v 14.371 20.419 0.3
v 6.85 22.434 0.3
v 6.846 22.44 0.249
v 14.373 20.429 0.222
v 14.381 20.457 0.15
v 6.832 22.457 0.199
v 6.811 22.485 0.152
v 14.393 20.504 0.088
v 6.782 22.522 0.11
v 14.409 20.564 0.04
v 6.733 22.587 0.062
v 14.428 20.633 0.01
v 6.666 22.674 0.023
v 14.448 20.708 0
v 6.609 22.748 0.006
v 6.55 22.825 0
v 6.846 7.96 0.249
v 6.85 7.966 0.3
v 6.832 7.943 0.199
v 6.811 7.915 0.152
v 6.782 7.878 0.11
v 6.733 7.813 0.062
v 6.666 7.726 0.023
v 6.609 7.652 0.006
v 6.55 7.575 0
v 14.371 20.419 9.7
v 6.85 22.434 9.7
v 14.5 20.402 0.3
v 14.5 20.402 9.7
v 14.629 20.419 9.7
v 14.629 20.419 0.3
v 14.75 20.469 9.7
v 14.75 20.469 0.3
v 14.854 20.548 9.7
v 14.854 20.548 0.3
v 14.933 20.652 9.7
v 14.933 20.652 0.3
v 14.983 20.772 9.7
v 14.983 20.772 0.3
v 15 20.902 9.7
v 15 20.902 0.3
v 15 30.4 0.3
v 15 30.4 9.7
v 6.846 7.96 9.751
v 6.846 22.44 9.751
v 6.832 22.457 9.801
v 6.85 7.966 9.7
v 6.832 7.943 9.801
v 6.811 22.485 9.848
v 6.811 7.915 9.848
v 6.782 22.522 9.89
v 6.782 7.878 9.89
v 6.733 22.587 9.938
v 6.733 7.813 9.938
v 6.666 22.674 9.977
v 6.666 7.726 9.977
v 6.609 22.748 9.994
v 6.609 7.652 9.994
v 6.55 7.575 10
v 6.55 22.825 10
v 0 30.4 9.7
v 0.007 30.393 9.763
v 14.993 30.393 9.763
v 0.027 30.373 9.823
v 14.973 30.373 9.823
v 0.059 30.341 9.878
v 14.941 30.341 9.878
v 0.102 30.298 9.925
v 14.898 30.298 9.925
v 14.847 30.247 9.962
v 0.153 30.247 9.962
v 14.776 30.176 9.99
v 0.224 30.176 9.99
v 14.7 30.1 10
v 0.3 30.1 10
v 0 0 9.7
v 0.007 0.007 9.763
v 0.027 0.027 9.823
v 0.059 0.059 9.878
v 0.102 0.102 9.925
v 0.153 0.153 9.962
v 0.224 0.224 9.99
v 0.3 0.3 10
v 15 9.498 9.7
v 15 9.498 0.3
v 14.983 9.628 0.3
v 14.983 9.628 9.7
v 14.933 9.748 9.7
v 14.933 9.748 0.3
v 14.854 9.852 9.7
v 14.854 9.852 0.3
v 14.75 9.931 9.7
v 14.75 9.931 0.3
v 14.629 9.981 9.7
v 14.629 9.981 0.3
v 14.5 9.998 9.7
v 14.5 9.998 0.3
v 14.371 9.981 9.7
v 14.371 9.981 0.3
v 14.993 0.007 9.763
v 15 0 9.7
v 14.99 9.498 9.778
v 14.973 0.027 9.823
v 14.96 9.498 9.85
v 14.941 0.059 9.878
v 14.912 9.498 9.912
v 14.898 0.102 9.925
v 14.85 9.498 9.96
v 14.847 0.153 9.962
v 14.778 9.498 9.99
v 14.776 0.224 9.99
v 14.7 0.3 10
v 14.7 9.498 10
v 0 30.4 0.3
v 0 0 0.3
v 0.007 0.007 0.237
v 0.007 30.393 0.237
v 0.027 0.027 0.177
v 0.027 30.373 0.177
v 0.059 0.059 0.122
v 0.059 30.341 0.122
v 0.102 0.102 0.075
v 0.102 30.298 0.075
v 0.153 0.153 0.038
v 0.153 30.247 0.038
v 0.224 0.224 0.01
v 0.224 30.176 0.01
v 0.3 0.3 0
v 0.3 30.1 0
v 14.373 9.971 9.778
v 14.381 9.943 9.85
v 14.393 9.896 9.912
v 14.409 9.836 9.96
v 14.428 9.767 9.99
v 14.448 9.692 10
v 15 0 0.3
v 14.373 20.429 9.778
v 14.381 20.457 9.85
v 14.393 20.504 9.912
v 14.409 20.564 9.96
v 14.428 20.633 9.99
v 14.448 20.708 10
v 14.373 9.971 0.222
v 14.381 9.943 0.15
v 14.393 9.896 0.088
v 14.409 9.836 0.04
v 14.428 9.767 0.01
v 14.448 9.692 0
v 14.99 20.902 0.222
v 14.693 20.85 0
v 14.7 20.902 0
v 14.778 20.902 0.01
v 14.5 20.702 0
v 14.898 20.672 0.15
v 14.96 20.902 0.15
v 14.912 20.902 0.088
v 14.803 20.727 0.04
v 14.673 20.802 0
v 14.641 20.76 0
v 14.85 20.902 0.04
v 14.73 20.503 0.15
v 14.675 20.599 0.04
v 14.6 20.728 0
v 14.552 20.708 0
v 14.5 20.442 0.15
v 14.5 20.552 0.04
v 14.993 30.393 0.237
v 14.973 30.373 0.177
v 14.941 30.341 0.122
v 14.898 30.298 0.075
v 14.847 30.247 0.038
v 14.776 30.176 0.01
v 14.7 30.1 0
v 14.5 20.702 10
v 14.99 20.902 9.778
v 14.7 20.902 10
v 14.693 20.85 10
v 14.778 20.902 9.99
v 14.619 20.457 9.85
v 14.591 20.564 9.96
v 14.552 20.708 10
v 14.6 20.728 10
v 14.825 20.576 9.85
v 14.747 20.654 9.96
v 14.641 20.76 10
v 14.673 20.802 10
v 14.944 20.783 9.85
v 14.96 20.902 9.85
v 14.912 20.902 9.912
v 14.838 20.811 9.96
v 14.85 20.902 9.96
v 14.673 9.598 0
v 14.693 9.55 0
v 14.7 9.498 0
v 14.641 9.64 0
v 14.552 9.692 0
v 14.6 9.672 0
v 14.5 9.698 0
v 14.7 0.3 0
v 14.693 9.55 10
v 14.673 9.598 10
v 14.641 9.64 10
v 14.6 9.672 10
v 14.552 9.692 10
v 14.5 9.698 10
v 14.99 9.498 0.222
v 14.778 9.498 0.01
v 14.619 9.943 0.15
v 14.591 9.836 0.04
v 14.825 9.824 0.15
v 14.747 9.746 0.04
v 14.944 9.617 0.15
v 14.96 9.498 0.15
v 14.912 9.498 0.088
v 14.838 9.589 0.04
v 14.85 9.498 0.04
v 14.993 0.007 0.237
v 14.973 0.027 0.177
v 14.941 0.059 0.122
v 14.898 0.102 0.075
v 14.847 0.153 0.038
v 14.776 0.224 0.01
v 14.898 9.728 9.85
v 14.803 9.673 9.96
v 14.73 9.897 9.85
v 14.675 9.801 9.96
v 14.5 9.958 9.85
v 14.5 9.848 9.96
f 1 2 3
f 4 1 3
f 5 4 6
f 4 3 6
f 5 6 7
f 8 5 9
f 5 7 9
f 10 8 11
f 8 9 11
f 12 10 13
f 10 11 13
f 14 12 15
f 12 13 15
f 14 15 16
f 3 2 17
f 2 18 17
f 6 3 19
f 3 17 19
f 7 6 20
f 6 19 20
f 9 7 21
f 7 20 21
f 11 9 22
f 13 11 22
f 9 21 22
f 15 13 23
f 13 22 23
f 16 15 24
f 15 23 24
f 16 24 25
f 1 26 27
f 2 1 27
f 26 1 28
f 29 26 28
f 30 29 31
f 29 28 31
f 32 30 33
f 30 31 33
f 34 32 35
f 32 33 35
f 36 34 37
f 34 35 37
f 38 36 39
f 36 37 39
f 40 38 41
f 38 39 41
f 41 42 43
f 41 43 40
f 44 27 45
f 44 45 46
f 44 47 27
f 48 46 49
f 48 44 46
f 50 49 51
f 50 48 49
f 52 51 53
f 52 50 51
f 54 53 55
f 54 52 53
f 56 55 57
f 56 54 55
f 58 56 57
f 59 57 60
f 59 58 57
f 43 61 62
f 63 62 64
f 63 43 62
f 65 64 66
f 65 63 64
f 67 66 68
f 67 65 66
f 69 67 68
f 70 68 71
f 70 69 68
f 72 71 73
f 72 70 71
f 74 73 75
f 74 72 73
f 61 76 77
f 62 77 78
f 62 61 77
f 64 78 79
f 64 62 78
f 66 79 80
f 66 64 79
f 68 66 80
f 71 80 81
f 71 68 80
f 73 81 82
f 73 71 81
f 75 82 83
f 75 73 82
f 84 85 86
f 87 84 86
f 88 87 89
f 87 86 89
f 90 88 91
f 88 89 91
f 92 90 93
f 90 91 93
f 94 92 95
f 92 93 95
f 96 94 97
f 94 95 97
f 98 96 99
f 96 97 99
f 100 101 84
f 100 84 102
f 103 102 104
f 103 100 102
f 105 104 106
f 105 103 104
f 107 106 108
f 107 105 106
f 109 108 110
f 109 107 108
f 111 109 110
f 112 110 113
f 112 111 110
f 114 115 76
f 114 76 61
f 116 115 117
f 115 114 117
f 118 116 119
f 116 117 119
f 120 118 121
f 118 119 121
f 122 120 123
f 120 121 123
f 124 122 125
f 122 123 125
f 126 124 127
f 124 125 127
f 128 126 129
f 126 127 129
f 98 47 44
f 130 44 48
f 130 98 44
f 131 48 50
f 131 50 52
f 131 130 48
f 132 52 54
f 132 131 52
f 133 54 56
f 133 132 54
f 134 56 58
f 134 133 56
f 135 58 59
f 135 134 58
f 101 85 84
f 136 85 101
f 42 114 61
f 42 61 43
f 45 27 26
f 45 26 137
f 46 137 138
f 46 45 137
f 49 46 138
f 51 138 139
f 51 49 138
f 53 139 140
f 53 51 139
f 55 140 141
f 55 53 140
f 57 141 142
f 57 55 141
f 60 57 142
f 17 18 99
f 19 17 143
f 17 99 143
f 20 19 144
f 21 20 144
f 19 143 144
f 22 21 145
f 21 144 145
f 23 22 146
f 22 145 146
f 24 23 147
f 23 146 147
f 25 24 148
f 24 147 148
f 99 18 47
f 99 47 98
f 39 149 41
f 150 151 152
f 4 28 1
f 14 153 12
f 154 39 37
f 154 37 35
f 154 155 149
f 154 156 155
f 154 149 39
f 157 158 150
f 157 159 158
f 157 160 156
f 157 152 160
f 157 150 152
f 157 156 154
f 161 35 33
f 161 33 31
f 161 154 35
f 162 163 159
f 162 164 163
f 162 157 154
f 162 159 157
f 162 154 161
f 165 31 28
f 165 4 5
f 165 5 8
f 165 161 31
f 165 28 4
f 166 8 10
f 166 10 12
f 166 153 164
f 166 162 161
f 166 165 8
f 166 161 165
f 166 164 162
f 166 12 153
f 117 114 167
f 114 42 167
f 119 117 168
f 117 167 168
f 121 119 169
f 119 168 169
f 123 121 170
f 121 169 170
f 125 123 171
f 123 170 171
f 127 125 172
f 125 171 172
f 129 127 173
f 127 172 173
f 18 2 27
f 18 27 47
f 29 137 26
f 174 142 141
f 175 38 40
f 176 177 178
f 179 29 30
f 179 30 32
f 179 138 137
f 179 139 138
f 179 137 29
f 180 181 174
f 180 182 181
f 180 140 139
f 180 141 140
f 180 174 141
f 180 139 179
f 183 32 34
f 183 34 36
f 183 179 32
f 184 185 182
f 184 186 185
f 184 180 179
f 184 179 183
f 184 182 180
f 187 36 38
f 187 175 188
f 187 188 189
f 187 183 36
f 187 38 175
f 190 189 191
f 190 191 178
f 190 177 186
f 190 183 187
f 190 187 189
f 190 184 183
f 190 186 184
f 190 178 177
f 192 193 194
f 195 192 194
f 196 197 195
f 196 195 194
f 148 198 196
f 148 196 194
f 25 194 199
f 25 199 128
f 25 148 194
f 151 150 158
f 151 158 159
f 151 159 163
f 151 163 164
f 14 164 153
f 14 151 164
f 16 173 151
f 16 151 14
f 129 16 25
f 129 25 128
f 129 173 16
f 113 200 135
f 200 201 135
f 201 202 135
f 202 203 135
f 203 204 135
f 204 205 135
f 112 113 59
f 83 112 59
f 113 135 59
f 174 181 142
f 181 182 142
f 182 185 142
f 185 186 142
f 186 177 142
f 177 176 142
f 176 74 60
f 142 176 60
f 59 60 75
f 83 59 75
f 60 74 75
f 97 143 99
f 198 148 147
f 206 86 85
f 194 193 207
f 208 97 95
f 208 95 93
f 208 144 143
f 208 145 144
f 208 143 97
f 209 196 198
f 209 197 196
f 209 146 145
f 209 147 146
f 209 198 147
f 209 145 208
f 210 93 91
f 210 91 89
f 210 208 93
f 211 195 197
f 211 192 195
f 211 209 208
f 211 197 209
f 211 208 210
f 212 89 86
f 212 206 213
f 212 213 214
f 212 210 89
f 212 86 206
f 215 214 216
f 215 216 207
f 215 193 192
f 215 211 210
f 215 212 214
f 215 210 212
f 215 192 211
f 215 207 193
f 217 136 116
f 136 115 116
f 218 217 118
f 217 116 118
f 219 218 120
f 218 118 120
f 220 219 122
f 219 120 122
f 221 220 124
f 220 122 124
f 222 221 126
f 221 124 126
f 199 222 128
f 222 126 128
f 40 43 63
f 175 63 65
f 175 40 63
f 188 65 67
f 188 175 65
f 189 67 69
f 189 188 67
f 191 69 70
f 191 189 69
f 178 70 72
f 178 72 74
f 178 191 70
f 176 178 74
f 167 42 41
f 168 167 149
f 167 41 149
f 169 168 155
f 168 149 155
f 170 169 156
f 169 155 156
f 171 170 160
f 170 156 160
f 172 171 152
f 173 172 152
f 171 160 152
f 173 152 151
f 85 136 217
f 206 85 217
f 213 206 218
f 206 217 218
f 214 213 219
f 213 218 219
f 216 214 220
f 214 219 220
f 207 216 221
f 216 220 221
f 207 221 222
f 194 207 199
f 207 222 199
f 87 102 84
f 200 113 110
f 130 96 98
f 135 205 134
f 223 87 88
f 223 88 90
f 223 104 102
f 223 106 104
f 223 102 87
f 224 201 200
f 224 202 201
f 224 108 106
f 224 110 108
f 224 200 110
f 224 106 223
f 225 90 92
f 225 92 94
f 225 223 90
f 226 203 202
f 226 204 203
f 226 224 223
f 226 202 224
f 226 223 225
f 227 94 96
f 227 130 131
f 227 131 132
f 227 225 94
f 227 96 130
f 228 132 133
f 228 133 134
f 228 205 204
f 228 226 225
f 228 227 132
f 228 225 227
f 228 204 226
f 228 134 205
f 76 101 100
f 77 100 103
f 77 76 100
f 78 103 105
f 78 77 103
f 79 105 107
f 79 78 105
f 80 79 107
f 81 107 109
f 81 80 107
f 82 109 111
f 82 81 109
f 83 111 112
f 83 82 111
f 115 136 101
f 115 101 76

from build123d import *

# Parameters (mm, degrees)
BOSS_EXTRU_1_DEPTH = 10
CONG_1_R           = 0.3
CONG_2_R           = 0.5


with BuildPart() as part:
    # Esquisse1 → Boss.-Extru.1 (new body)
    with BuildSketch(Plane.XY):
        Polygon((15, 20.25), (6.85, 22.433785918), (6.85, 7.966214082), (15, 10.15), (15, 0), (0, 0), (0, 30.4), (15, 30.4), align=None)
    extrude(amount=BOSS_EXTRU_1_DEPTH)

    # Congé1
    cong_1_edges = [part.edges().sort_by_distance(p)[0] for p in [
        (10.925, 9.058107041, 0),
        (15, 5.075, 0),
        (7.5, 0, 0),
        (0, 15.2, 0),
        (15, 5.075, 10),
        (10.925, 9.058107041, 10),
        (6.85, 15.2, 10),
        (10.925, 21.341892959, 10),
        (15, 25.325, 10),
        (7.5, 30.4, 10),
        (0, 15.2, 10),
        (7.5, 30.4, 0),
        (7.5, 0, 10),
        (15, 25.325, 0),
        (10.925, 21.341892959, 0),
        (6.85, 15.2, 0),
    ]]
    fillet(cong_1_edges, radius=CONG_1_R)

    # Congé2
    # the kernel refuses this fillet: 0.5 mm, written as the material it takes off along each edge
    with BuildSketch(Plane(origin=(14.5, 20.901612686, 0), x_dir=(1, 0, 0), z_dir=(0, 1, 0))) as cong_2_piece_1:
        with BuildLine():
            CenterArc((0.2, -0.3), 0.3, 0, 90)
            Line((0.5, -0.3), (0.5, 0))
            Line((0.5, 0), (0.2, 0))
        make_face()
    revolve(axis=Axis((14.5, 20.901612686, 0), (0, 0, -1)), revolution_arc=105, mode=Mode.SUBTRACT)
    with BuildSketch(Plane(origin=(14.5, 9.498387314, 0), x_dir=(-0.2588190451025178, 0.9659258262890691, 0), z_dir=(-0.9659258262890691, -0.2588190451025178, 0))) as cong_2_piece_2:
        with BuildLine():
            CenterArc((0.2, -0.3), 0.3, 0, 90)
            Line((0.5, -0.3), (0.5, 0))
            Line((0.5, 0), (0.2, 0))
        make_face()
    revolve(axis=Axis((14.5, 9.498387314, 0), (0, 0, -1)), revolution_arc=105, mode=Mode.SUBTRACT)
    with BuildSketch(Plane(origin=(14.5, 9.498387314, 10), x_dir=(1, 0, 0), z_dir=(0, -1, 0))) as cong_2_piece_3:
        with BuildLine():
            CenterArc((0.2, -0.3), 0.3, 0, 90)
            Line((0.5, -0.3), (0.5, 0))
            Line((0.5, 0), (0.2, 0))
        make_face()
    revolve(axis=Axis((14.5, 9.498387314, 10), (0, 0, 1)), revolution_arc=105, mode=Mode.SUBTRACT)
    with BuildSketch(Plane(origin=(14.5, 20.901612686, 10), x_dir=(-0.2588190451025179, -0.9659258262890691, 0), z_dir=(-0.9659258262890691, 0.2588190451025179, 0))) as cong_2_piece_4:
        with BuildLine():
            CenterArc((0.2, -0.3), 0.3, 0, 90)
            Line((0.5, -0.3), (0.5, 0))
            Line((0.5, 0), (0.2, 0))
        make_face()
    revolve(axis=Axis((14.5, 20.901612686, 10), (0, 0, 1)), revolution_arc=105, mode=Mode.SUBTRACT)
    with BuildSketch(Plane(origin=(15, 10.15, 0), x_dir=(-0.9659258262890693, -0.25881904510251724, 0), z_dir=(0, 0, 1))) as cong_2_piece_5:
        with BuildLine():
            CenterArc((CONG_2_R * 1.30322537284, CONG_2_R), CONG_2_R, 165, 105)
            Line((CONG_2_R * 0.337299546552, CONG_2_R * 1.2588190451), (0, 0))
            Line((0, 0), (CONG_2_R * 1.30322537284, 0))
        make_face()
    extrude(amount=10, mode=Mode.SUBTRACT)
    with BuildSketch(Plane(origin=(15, 20.25, 0), x_dir=(-0.9659258262890691, 0.2588190451025179, 0), z_dir=(0, 0, 1))) as cong_2_piece_6:
        with BuildLine():
            CenterArc((CONG_2_R * 1.30322537284, -CONG_2_R), CONG_2_R, 90, 105)
            Line((CONG_2_R * 0.337299546552, -CONG_2_R * 1.2588190451), (0, 0))
            Line((0, 0), (CONG_2_R * 1.30322537284, 0))
        make_face()
    extrude(amount=10, mode=Mode.SUBTRACT)


solid = part.part
